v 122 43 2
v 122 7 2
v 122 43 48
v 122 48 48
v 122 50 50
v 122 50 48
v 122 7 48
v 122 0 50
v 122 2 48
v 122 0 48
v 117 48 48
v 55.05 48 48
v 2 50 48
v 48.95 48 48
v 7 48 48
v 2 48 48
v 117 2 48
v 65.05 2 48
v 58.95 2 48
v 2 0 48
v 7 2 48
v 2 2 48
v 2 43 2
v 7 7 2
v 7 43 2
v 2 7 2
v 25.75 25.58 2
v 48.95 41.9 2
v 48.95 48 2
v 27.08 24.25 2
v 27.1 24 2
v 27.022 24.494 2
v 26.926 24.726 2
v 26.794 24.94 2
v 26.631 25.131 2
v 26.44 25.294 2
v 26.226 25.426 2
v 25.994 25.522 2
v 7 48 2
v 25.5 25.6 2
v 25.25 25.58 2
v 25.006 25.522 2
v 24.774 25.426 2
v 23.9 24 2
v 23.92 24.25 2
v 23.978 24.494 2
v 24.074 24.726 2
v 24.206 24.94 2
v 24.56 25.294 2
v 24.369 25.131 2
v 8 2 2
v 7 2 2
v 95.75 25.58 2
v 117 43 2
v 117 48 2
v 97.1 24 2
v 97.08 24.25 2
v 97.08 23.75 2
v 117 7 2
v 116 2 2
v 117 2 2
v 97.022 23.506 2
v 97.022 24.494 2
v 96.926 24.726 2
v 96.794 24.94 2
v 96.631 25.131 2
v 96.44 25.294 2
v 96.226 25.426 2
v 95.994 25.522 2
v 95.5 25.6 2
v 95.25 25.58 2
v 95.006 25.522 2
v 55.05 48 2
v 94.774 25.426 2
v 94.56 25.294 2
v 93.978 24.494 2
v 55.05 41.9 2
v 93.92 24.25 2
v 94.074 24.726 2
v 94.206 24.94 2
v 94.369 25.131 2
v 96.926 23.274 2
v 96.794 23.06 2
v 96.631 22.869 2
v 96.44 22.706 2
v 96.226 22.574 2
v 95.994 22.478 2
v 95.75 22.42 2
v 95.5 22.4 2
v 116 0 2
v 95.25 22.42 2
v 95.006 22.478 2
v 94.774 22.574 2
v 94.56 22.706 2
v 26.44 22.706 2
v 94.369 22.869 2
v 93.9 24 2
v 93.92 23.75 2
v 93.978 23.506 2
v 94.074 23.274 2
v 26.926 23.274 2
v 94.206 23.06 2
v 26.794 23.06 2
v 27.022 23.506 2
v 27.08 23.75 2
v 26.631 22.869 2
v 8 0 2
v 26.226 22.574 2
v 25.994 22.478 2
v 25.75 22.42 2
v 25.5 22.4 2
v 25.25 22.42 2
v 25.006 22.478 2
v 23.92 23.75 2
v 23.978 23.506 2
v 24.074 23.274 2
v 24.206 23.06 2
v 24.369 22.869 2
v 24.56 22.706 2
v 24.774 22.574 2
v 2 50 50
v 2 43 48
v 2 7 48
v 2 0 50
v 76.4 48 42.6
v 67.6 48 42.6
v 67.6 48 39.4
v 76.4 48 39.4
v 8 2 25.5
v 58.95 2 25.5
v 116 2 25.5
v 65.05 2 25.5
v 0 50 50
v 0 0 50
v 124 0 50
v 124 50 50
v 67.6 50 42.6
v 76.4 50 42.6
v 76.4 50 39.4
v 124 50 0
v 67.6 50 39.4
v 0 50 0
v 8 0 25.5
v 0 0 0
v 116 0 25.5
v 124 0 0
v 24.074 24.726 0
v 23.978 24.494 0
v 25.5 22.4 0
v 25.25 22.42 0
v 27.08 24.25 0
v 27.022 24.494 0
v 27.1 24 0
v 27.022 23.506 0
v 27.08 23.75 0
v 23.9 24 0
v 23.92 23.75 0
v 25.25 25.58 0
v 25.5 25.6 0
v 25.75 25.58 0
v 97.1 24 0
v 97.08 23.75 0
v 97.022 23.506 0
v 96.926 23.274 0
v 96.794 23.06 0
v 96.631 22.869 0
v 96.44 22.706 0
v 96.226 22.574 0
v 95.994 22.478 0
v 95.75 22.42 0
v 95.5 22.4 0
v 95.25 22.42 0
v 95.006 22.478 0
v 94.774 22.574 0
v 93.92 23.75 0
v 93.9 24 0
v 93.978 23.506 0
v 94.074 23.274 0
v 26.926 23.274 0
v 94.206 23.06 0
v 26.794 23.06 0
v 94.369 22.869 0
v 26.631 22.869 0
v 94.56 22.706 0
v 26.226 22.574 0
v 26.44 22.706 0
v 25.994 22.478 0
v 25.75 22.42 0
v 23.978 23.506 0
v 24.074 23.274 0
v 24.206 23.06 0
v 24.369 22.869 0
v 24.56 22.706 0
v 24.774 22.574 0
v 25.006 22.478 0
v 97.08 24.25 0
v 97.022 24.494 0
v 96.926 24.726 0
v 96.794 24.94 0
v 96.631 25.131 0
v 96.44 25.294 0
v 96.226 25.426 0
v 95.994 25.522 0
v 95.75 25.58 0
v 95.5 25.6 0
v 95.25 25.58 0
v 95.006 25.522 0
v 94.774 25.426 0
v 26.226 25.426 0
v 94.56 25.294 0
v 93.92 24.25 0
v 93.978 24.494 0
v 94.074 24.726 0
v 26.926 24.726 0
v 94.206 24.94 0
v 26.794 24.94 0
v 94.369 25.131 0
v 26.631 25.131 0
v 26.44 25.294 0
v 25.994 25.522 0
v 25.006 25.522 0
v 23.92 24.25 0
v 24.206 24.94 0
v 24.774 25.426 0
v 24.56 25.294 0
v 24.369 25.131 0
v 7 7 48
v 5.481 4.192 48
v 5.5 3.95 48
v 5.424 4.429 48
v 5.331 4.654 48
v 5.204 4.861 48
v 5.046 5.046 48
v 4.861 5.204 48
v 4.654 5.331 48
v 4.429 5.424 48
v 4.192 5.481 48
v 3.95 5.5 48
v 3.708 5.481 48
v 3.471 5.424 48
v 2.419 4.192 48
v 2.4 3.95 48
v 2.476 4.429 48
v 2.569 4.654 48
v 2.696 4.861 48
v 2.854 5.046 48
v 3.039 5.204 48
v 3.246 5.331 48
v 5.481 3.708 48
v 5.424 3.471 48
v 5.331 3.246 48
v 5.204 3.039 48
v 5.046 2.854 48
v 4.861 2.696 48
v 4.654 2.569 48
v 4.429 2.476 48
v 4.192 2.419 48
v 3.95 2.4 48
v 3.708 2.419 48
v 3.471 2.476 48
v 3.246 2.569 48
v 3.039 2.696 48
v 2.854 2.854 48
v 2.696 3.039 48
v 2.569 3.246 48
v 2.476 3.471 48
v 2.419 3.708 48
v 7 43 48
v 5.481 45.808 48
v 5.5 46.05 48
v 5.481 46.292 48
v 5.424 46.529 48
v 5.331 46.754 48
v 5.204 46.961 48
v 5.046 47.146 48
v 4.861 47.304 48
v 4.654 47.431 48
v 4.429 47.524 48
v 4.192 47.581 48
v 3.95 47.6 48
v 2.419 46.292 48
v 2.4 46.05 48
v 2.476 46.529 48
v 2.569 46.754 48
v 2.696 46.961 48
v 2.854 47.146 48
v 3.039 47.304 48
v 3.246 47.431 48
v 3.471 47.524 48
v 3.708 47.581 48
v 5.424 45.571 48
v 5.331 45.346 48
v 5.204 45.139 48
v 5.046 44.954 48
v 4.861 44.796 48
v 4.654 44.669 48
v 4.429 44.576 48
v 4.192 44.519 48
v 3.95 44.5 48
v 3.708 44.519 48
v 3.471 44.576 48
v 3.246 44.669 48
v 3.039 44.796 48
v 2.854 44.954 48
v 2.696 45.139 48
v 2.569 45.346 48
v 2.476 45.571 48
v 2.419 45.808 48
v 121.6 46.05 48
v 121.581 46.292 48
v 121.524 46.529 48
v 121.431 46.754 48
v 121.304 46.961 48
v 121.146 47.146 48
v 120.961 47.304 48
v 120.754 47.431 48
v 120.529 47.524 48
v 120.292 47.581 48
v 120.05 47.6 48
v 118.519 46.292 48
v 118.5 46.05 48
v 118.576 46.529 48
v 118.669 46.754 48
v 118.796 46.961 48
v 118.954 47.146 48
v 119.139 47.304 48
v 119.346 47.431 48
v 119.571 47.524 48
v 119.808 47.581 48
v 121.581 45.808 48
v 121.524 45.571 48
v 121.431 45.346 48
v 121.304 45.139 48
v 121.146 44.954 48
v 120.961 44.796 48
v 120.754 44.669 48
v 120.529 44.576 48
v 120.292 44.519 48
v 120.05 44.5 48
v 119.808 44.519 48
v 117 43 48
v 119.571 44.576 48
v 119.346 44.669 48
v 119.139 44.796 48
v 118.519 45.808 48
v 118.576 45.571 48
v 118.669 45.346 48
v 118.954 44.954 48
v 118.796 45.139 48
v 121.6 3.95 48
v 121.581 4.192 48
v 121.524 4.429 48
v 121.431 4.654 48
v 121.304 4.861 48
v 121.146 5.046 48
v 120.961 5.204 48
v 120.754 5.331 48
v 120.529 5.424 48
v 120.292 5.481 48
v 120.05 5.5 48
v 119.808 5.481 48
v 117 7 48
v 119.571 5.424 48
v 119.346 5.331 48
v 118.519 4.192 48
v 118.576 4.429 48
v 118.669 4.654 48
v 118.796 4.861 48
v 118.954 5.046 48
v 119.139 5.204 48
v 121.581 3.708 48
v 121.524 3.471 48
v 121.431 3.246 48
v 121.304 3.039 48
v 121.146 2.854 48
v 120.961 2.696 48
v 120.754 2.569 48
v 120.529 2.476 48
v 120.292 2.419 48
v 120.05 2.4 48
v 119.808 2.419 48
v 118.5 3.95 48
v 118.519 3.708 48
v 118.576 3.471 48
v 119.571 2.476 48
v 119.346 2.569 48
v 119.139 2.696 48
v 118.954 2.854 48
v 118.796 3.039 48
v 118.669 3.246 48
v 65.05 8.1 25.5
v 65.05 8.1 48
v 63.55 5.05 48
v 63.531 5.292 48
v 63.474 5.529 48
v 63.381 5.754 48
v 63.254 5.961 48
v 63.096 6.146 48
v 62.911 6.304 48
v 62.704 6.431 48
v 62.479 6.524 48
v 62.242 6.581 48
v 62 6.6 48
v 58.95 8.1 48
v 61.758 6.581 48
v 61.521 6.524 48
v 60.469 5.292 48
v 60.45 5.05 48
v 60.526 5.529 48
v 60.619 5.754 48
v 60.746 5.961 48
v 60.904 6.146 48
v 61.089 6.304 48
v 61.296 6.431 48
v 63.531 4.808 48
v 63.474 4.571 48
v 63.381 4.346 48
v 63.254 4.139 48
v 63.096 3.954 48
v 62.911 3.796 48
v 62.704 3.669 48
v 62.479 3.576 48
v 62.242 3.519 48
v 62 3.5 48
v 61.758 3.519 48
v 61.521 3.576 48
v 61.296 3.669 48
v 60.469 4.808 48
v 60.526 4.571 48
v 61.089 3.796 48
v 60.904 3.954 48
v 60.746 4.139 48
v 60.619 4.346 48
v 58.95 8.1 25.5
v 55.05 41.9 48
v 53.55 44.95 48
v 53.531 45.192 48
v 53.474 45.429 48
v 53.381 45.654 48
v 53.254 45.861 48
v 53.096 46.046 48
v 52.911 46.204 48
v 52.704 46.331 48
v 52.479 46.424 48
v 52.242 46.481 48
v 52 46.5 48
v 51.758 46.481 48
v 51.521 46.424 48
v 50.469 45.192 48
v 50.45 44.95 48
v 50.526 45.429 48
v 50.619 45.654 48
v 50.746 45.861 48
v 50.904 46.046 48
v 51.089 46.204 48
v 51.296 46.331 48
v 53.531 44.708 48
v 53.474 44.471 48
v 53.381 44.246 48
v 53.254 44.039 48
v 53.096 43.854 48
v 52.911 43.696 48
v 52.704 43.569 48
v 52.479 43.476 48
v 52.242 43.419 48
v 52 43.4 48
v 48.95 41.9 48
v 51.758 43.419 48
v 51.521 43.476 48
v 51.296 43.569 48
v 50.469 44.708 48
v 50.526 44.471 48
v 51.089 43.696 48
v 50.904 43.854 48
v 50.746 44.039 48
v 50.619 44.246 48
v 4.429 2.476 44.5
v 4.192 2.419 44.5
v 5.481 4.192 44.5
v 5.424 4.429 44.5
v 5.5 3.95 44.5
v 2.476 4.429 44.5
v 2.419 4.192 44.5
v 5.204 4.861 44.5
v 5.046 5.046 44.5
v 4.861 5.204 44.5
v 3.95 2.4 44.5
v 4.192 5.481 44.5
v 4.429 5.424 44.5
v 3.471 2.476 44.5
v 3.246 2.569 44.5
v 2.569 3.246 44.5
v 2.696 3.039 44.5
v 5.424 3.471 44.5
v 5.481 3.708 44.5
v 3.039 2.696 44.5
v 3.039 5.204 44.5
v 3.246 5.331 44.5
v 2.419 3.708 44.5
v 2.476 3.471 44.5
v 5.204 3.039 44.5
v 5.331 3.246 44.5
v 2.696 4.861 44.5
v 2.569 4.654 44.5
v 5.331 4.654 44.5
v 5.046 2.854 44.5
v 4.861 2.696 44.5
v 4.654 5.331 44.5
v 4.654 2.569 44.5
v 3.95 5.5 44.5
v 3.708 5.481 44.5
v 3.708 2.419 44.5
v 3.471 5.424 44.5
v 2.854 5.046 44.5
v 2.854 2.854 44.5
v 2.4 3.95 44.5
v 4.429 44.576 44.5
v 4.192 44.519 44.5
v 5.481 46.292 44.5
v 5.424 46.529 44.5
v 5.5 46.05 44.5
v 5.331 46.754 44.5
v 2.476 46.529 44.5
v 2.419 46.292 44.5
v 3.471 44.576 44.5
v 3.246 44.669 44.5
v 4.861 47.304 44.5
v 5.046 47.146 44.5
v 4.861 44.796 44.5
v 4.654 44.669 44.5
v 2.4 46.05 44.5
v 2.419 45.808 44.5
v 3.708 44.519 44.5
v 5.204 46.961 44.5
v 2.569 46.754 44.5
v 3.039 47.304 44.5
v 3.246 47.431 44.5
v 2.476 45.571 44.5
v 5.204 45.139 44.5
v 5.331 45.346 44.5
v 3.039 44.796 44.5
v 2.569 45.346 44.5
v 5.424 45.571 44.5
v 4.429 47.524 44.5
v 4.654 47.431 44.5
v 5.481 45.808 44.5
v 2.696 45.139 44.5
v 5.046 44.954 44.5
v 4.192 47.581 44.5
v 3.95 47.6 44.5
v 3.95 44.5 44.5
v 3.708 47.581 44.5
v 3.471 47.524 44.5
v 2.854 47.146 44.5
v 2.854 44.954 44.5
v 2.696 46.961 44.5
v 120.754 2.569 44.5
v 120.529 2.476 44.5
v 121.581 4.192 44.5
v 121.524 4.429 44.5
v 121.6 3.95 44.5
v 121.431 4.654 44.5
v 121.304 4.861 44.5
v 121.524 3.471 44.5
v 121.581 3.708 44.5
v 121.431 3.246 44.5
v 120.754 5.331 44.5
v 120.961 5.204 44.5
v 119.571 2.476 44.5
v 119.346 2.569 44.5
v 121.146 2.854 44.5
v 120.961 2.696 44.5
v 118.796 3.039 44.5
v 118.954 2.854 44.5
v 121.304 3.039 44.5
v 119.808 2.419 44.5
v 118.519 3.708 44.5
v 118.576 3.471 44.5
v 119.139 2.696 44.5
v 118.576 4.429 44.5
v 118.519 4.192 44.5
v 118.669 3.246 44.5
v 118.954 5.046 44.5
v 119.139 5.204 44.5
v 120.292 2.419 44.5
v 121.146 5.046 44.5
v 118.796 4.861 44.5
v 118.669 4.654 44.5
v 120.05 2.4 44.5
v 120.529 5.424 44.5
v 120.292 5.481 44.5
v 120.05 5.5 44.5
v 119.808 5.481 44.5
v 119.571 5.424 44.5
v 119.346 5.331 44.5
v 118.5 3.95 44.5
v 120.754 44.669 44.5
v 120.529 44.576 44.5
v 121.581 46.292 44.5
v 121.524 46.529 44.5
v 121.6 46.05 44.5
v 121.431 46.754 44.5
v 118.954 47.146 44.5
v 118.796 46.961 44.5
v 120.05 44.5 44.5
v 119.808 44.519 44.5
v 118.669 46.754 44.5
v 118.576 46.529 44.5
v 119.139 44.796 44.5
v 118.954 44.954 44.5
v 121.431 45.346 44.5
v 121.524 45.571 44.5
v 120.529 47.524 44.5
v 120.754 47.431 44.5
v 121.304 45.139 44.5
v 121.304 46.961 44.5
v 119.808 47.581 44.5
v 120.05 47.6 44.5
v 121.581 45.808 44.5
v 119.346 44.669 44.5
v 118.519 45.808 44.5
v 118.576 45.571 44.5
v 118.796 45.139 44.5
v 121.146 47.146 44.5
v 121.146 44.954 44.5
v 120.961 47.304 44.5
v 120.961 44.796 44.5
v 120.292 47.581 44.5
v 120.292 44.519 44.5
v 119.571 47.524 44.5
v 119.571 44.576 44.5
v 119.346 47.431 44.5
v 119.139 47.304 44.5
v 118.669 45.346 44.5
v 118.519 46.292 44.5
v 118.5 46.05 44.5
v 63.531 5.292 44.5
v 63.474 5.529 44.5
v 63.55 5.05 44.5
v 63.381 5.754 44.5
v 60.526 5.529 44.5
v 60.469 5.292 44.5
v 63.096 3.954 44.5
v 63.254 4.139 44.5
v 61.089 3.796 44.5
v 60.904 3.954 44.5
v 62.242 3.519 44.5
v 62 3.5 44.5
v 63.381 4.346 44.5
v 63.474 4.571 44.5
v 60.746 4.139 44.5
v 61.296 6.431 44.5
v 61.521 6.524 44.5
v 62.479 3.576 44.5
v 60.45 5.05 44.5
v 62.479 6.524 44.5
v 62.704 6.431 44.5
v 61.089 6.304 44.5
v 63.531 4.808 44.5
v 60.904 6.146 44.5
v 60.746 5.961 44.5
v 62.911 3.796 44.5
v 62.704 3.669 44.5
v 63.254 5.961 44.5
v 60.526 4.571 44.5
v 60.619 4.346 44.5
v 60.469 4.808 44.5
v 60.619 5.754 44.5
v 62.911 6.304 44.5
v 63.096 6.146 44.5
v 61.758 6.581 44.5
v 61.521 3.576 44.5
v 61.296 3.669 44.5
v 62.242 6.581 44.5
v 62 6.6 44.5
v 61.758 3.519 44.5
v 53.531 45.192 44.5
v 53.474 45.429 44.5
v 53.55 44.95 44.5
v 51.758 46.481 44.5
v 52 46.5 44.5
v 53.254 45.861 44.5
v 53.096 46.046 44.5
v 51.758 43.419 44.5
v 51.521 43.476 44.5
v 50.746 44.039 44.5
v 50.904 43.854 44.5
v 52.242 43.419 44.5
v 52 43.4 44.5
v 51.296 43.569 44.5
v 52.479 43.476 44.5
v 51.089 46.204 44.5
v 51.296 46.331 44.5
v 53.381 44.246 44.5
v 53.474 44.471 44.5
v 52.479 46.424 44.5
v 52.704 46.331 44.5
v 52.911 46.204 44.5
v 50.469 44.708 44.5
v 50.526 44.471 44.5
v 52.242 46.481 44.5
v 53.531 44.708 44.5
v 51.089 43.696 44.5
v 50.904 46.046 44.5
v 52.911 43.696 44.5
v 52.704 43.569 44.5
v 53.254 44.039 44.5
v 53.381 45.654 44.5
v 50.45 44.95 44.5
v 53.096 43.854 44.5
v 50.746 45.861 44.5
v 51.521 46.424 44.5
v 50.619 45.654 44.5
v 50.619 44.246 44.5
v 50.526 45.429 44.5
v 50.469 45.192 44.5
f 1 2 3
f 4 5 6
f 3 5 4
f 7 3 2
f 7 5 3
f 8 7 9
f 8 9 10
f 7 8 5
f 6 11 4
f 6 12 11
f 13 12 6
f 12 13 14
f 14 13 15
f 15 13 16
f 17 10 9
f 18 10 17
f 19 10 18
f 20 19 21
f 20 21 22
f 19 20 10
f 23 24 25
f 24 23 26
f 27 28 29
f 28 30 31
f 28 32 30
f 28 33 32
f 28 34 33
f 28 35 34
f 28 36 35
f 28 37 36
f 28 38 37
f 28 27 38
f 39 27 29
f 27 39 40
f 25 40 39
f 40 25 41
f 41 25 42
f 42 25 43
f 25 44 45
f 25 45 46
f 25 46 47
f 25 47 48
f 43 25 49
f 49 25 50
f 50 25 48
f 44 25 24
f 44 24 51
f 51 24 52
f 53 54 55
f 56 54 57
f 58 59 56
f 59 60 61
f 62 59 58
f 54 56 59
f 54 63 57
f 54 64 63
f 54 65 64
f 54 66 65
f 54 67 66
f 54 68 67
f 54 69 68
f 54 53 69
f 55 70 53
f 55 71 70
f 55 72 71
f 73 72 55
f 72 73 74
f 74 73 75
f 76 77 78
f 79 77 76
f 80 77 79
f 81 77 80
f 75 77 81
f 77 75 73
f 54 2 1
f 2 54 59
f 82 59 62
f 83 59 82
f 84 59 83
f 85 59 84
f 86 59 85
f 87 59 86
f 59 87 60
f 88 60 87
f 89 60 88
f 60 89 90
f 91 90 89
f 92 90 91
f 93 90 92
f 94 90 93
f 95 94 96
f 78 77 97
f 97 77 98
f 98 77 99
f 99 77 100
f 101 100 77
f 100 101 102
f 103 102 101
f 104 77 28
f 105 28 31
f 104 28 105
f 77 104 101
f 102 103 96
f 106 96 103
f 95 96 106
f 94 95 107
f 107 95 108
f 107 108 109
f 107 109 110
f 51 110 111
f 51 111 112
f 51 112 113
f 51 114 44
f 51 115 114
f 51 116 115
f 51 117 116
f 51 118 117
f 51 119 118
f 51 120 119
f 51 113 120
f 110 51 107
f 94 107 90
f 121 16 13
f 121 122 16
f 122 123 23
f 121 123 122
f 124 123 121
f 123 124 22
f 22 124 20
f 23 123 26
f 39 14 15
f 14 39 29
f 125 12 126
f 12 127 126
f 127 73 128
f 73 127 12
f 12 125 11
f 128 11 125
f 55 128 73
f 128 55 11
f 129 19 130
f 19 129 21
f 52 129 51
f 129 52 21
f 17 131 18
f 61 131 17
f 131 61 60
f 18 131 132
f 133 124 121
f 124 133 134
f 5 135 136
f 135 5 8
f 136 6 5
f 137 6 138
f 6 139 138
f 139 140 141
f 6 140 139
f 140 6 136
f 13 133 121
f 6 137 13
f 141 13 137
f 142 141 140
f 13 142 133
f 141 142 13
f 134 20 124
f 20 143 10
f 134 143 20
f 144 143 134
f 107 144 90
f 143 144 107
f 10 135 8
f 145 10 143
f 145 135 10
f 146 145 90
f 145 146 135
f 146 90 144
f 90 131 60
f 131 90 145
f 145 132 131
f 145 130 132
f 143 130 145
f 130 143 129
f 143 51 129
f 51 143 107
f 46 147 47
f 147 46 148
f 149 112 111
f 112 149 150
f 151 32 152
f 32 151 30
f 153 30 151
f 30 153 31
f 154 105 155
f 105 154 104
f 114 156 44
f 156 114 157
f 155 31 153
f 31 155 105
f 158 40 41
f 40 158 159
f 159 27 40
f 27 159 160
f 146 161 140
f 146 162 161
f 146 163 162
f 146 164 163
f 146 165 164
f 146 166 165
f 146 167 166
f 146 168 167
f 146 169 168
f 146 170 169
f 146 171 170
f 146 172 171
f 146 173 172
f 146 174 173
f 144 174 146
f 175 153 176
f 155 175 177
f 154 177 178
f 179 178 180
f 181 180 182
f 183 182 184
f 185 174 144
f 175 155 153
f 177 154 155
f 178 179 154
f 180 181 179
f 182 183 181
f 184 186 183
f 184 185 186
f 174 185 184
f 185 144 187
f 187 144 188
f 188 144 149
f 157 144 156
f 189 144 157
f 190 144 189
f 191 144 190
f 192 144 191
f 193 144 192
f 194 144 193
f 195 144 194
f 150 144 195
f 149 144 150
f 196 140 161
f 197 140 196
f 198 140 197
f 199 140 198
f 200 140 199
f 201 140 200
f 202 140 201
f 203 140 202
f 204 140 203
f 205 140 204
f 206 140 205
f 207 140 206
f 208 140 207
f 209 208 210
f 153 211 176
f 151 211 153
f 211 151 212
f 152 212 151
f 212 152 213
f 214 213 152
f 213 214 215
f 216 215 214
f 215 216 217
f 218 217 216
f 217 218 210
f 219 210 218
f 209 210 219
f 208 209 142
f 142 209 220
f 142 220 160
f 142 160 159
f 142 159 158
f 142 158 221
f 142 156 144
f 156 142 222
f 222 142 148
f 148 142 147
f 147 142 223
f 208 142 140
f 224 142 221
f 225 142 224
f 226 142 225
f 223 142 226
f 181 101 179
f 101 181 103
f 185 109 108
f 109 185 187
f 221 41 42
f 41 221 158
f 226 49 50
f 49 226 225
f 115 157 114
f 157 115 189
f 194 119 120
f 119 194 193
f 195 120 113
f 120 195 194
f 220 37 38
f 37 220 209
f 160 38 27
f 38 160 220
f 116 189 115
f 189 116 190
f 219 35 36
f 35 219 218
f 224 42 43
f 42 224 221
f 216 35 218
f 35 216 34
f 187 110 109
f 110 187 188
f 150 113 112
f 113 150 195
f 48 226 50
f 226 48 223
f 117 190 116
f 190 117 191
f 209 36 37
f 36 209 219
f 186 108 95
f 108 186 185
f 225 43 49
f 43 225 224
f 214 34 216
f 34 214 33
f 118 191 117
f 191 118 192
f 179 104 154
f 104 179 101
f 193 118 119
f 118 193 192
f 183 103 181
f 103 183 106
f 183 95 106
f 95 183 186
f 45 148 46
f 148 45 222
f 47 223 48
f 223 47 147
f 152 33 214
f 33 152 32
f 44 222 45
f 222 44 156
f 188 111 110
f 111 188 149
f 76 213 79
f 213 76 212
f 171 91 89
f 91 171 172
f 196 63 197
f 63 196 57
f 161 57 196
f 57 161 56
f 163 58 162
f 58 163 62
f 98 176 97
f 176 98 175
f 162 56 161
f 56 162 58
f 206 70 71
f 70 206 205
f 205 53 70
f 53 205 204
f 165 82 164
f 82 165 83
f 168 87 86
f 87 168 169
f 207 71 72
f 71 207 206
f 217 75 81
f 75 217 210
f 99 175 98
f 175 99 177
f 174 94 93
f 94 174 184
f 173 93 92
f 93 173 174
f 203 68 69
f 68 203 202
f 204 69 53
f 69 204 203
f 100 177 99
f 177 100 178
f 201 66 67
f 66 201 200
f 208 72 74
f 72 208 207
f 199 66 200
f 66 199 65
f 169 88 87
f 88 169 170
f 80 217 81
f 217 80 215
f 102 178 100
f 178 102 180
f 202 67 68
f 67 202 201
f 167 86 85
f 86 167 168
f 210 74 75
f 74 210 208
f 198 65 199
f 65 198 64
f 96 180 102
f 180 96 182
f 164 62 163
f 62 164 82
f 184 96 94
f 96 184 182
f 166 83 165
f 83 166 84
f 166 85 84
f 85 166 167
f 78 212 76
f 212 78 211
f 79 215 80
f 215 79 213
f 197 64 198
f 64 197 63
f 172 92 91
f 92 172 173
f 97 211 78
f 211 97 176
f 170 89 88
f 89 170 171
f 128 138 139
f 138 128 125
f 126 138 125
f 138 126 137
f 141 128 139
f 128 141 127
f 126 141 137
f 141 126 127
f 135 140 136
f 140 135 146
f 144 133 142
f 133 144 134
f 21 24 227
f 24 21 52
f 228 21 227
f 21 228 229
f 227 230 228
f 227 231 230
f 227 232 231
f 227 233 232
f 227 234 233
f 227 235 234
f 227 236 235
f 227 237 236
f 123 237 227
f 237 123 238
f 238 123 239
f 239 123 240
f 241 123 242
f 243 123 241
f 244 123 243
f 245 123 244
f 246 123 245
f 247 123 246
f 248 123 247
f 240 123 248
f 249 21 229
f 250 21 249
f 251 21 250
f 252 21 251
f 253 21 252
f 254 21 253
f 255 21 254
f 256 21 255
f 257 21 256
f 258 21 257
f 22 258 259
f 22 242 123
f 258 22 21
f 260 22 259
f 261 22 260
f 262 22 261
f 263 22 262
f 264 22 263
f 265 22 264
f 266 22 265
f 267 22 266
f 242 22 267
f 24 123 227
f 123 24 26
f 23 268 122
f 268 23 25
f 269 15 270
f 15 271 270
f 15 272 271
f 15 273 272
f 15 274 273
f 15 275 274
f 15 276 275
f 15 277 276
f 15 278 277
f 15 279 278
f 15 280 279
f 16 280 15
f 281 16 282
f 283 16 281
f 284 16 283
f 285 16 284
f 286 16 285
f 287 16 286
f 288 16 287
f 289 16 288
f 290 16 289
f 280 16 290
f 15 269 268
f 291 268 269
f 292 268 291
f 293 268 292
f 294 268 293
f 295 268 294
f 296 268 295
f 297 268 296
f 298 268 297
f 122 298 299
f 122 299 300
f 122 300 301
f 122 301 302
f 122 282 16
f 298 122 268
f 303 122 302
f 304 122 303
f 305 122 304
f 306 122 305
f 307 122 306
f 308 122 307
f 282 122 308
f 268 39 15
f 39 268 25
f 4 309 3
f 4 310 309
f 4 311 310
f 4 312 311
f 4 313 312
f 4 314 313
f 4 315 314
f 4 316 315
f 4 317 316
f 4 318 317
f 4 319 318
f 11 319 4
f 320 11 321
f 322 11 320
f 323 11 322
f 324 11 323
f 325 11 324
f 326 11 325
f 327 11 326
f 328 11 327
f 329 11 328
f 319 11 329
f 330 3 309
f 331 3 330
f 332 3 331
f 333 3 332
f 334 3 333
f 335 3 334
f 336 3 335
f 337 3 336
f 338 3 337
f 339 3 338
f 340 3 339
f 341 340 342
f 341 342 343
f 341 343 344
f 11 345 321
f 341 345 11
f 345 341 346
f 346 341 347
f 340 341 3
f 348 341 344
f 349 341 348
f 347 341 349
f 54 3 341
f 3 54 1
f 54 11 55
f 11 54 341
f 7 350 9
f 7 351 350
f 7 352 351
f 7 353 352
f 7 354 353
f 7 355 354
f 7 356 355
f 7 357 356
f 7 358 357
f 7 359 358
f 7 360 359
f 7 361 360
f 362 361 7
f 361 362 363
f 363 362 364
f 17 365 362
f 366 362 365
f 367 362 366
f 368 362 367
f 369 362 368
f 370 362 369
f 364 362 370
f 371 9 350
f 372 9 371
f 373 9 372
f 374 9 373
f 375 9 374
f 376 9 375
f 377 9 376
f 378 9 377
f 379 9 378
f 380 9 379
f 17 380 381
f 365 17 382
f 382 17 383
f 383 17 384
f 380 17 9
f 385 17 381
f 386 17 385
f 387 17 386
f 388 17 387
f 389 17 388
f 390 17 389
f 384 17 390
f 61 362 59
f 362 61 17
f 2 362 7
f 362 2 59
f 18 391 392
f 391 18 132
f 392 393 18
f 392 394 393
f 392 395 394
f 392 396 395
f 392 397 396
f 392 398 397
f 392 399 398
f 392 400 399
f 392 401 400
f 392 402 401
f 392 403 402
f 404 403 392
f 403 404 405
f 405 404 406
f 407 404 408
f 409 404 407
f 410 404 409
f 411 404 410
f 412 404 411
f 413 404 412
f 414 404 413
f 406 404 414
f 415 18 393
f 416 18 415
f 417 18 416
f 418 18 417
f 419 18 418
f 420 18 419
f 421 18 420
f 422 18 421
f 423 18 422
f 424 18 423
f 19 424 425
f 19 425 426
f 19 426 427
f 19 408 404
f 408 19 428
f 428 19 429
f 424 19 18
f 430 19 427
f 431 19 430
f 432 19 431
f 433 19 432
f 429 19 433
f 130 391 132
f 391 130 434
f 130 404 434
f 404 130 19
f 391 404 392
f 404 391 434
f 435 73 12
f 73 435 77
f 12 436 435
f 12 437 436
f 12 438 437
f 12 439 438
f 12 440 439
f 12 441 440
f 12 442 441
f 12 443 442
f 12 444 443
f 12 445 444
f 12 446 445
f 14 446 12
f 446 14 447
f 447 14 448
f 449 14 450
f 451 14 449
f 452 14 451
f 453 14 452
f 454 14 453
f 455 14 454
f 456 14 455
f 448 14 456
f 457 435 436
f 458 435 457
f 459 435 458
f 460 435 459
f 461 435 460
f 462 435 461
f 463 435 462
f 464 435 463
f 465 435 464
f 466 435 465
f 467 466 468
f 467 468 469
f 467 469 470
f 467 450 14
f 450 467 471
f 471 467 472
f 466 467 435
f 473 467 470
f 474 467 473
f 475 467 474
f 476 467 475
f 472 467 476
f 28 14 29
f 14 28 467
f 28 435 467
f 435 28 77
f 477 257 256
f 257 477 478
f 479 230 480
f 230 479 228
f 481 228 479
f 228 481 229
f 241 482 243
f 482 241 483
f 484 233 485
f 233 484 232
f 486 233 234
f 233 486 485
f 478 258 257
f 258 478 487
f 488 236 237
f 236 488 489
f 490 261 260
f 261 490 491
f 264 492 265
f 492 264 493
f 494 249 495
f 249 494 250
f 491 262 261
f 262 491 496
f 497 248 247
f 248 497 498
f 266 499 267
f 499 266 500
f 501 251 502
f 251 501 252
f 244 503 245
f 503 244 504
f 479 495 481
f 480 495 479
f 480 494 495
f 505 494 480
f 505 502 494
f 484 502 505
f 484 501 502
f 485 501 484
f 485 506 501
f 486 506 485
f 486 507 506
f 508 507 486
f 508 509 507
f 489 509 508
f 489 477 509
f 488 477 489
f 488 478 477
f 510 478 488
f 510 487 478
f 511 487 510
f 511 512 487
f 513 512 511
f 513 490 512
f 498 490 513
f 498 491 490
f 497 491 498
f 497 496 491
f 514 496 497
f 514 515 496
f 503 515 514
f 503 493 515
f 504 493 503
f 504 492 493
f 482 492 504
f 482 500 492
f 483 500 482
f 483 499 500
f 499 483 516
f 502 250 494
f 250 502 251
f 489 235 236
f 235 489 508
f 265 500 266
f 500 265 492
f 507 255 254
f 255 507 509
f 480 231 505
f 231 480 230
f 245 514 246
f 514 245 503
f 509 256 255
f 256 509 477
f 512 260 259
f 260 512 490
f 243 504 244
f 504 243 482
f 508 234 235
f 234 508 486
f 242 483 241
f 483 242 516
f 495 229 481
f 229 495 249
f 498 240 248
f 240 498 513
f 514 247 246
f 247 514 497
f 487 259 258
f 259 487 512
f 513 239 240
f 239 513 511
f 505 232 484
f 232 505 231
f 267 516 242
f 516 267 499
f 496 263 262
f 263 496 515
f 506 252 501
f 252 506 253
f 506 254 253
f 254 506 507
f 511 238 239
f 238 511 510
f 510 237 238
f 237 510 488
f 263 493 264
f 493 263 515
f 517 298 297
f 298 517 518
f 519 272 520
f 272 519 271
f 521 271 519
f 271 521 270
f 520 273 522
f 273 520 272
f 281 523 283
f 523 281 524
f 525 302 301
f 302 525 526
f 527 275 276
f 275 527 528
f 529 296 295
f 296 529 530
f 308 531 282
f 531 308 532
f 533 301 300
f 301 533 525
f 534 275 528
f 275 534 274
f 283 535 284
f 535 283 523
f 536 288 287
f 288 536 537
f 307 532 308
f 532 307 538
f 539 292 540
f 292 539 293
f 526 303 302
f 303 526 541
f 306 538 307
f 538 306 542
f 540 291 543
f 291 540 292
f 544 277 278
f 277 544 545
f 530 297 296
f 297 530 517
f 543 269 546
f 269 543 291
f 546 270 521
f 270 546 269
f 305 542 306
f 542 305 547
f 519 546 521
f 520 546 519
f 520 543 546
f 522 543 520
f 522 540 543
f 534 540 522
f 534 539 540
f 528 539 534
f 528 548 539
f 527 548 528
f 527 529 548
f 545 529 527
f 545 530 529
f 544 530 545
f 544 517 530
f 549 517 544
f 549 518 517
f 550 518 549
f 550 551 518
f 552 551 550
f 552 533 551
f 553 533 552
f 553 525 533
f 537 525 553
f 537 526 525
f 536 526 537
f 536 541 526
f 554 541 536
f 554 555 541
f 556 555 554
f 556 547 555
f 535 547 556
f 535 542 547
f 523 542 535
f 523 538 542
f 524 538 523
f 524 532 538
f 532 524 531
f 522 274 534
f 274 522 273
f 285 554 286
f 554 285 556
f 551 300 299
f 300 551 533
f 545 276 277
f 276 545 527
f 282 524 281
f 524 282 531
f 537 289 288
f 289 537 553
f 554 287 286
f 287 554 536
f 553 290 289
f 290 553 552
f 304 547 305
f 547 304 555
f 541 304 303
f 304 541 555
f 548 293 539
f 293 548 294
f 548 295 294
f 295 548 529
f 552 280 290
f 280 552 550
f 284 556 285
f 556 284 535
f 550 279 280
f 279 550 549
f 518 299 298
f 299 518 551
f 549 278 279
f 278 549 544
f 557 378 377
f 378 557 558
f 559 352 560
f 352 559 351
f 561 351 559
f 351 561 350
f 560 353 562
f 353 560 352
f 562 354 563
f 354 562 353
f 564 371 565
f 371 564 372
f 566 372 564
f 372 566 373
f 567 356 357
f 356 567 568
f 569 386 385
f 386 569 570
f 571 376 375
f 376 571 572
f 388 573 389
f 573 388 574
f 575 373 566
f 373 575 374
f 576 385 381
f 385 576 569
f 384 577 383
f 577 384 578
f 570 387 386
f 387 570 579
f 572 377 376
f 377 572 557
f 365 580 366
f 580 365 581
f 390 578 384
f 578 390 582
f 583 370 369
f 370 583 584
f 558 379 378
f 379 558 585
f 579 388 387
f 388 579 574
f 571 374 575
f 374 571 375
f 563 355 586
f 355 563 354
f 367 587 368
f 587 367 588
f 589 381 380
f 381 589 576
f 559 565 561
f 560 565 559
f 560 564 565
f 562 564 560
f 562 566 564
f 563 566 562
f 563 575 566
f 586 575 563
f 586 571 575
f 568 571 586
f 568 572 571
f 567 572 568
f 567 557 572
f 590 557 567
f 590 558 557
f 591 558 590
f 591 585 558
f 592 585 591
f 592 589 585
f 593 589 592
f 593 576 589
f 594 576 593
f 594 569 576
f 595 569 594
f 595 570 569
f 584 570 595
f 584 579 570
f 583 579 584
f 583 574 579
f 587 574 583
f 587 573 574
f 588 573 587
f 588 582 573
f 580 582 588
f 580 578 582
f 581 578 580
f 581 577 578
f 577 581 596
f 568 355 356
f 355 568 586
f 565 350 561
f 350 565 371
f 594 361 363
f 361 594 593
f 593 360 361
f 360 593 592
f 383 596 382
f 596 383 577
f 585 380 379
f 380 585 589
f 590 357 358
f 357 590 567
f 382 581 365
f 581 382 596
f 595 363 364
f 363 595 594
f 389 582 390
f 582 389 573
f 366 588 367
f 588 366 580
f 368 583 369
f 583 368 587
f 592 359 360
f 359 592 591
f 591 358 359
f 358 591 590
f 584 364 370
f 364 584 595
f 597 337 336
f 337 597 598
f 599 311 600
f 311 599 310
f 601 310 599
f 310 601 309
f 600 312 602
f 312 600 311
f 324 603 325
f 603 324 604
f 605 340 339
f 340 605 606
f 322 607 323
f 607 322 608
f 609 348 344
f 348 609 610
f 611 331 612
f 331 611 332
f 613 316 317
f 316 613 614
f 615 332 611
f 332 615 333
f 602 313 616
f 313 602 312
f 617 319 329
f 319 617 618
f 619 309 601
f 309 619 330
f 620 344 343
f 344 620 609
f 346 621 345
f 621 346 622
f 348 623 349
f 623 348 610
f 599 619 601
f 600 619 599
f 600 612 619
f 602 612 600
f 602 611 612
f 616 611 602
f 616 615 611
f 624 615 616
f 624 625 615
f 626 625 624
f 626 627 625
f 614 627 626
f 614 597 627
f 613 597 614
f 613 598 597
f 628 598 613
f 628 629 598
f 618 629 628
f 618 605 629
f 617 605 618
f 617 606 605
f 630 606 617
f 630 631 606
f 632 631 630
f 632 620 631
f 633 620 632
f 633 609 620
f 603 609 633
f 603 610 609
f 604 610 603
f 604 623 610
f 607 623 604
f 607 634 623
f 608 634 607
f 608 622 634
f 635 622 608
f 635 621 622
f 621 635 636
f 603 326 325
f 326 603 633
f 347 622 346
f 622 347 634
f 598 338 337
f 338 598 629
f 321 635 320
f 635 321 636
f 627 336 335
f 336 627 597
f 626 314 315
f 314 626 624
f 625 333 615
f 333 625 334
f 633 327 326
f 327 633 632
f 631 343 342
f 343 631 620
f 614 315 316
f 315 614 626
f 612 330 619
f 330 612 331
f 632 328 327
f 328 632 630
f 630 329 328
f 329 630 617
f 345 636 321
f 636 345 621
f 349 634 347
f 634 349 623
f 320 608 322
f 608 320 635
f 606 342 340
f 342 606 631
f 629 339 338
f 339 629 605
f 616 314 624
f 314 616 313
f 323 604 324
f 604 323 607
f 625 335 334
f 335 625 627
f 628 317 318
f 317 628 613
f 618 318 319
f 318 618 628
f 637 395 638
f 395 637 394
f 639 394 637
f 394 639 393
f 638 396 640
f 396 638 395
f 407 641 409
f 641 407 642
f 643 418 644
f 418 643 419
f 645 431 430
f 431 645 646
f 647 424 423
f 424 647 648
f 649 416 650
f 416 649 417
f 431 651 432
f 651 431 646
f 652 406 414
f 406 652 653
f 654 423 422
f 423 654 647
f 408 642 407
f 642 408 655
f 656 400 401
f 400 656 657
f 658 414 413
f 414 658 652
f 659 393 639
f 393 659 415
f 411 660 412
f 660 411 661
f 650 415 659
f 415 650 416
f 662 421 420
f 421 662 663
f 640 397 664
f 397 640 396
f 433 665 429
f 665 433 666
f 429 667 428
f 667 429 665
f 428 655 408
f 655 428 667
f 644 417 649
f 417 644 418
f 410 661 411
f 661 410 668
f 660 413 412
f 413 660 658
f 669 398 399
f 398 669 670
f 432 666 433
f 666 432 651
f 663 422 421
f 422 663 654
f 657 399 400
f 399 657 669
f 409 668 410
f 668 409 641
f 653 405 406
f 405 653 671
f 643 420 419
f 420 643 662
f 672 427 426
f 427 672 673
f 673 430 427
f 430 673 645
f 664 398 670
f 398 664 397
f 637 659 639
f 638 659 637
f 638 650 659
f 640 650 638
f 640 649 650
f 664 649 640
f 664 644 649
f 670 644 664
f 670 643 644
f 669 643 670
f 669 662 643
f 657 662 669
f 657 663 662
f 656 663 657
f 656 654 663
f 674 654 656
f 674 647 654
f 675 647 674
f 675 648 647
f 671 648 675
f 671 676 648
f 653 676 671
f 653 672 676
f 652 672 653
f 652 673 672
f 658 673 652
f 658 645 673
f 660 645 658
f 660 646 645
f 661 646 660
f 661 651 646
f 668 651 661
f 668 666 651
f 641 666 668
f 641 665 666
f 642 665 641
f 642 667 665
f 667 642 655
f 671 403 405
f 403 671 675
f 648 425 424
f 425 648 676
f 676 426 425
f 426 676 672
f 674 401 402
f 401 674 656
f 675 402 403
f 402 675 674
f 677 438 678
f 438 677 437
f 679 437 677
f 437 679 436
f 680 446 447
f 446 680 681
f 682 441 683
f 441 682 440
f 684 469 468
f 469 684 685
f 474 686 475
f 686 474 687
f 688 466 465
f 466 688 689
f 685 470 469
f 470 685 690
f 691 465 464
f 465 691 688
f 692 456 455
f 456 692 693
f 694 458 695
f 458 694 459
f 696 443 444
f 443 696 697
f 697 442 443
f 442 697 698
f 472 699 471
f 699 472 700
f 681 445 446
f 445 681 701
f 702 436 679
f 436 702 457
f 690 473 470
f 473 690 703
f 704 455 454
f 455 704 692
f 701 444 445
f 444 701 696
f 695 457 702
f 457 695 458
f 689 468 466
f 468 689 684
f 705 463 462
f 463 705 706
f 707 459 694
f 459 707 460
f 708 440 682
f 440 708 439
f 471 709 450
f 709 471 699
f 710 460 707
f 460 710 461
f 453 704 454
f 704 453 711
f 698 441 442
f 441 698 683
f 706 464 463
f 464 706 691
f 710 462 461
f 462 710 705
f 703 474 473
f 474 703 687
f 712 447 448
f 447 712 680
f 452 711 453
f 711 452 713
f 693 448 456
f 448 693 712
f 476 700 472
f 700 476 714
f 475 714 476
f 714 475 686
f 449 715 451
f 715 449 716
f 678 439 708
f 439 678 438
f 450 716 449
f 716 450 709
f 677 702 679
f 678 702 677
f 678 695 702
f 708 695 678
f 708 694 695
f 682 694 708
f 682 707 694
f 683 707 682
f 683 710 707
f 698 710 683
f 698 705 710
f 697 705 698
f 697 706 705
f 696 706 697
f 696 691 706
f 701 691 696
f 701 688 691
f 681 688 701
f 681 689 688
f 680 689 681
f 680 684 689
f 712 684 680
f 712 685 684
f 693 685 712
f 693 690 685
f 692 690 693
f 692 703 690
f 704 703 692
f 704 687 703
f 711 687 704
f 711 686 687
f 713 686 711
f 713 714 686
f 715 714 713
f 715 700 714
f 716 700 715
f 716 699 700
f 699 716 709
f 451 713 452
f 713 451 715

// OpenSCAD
// Enclosure for ESP32FW / ULN2003 / 28BYJ-48 - Box

$fn=40;

// Electronics lid definitions (copy and paste from corresponding SCAD file)
box_lid_screw_hole_radius=1;

box_drv_support_diameter=6;
box_drv_support_length=4;
box_drv_support_hole_depth=3;
box_drv_length=29.6;
box_drv_width=26.9;
box_drv_side_offset=2.7+1;

box_esp32c3_back=23.4;
box_esp32c3_width=17.8;
box_esp32c3_depth=11;
box_esp32c3_board_1=5.5;
box_esp32c3_board_thickness=1.3;
box_esp32c3_board_groove=2;
box_esp32c3_board_extra=3;
box_esp32c3_block_wall=box_esp32c3_back-box_esp32c3_depth;

// Electronics box definitions
box_length=124;
box_width=50;
box_height=50;
box_lid_thickness=2;
box_wall_thickness=2;
box_hole_height=22.5*0+23.5;
box_hole_length=108;
box_screw_separation=70;
box_screw_1_x=25.5;
box_screw_2_x=box_screw_1_x+box_screw_separation;
box_screw_y=24;
box_screw_diameter=3.2;
box_lid_support_hole_depth=3.5;
box_lid_support_hole_radius=3.1/2;
box_lid_support_hole_offset=1.5;
box_lid_support_mid_radius=2*box_lid_support_hole_radius+2*box_lid_support_hole_offset;
box_corner_radius=5;
box_boards_length=70;
box_side_height=box_height-box_lid_thickness;
box_usb_length=8.8;
box_usb_height=3.2;
box_usb_offset=5.4;
box_usb_distance=0;

// Box
difference()
 {
  // Box attaches to the wheel and provides support for the lid which holds the motor and the electronics 
   cube([box_length,box_width,box_height]);
   union()
   {
    // Box inner space
    translate([box_wall_thickness,box_wall_thickness,box_wall_thickness])
     cube([box_length-2*box_wall_thickness,box_width-2*box_wall_thickness,box_height-2*box_wall_thickness]);
    // Space for lid
    translate([box_wall_thickness,0,box_height-box_wall_thickness])
     cube([box_length-2*box_wall_thickness,box_width,box_wall_thickness]);
    // Hole for filter wheel
    translate([(box_length-box_hole_length)/2,0,box_wall_thickness])
     cube([box_hole_length,box_wall_thickness,box_hole_height]);
    // Holes for filter wheel screws 
    translate([box_screw_1_x,box_screw_y,0])
     cylinder(box_wall_thickness,d=box_screw_diameter);
    translate([box_screw_2_x,box_screw_y,0])
     cylinder(box_wall_thickness,d=box_screw_diameter);
    // Hole for ESP32-C3 usb connector
   translate([box_length-box_boards_length-0*box_wall_thickness+box_lid_support_mid_radius+box_esp32c3_board_extra+box_esp32c3_width/2-box_usb_length/2,box_width-box_wall_thickness,box_height-box_wall_thickness-box_usb_offset-box_usb_height])   
     cube([box_usb_length,box_wall_thickness,box_usb_height]);
   }
 } 
 
// Lid supports
difference()
 {
 union()
  {
   // Corner supports
   box_corner(0,box_wall_thickness,box_wall_thickness,box_wall_thickness,box_height-2*box_wall_thickness);
   box_corner(-90,box_wall_thickness,box_width-box_wall_thickness,box_wall_thickness,box_height-2*box_wall_thickness);
   box_corner(180,box_length-box_wall_thickness,box_width-box_wall_thickness,box_wall_thickness,box_height-2*box_wall_thickness);
   box_corner(90,box_length-box_wall_thickness,box_wall_thickness,box_wall_thickness,box_height-2*box_wall_thickness);
   
   // Middle supports
   translate([box_length/2-box_lid_support_mid_radius/2,box_wall_thickness,box_hole_height+box_wall_thickness])
    cube([box_lid_support_mid_radius,box_lid_support_mid_radius,box_height-box_hole_height-2*box_wall_thickness]);
   translate([box_length-box_boards_length-box_wall_thickness-box_lid_support_mid_radius/2,box_width-box_wall_thickness-box_lid_support_mid_radius,box_wall_thickness])
     cube([box_lid_support_mid_radius,box_lid_support_mid_radius,box_height-2*box_wall_thickness]);
  }
 union()
  {
   // Corner support holes
   box_lid_support_hole(box_wall_thickness+box_corner_radius-box_lid_support_hole_offset-box_lid_support_hole_radius,box_wall_thickness+box_corner_radius-box_lid_support_hole_offset-box_lid_support_hole_radius,box_side_height-box_lid_support_hole_depth);
   box_lid_support_hole(box_wall_thickness+box_corner_radius-box_lid_support_hole_offset-box_lid_support_hole_radius,box_width-box_wall_thickness-box_corner_radius+box_lid_support_hole_offset+box_lid_support_hole_radius,box_side_height-box_lid_support_hole_depth);
   box_lid_support_hole(box_length-box_wall_thickness-box_corner_radius+box_lid_support_hole_offset+box_lid_support_hole_radius,box_wall_thickness+box_corner_radius-box_lid_support_hole_offset-box_lid_support_hole_radius,box_side_height-box_lid_support_hole_depth);
   box_lid_support_hole(box_length-box_wall_thickness-box_corner_radius+box_lid_support_hole_offset+box_lid_support_hole_radius,box_width-box_wall_thickness-box_corner_radius+box_lid_support_hole_offset+box_lid_support_hole_radius,box_side_height-box_lid_support_hole_depth);

   // Middle supports holes   
   box_lid_support_hole(box_length/2,box_wall_thickness+box_lid_support_mid_radius-box_lid_support_hole_offset-box_lid_support_hole_radius,box_side_height-box_lid_support_hole_depth);
   box_lid_support_hole(box_length-box_boards_length-box_wall_thickness,box_width-box_wall_thickness-box_lid_support_mid_radius+box_lid_support_hole_offset+box_lid_support_hole_radius,box_side_height-box_lid_support_hole_depth);
      
  }
 }

// Modules

module box_corner(angle,x,y,z,length)
 {
  translate([x,y,z])
   rotate([0,0,angle])
    intersection()
     {
//      cylinder(h=scale*(box_side_height)-box_lid_thickness,r=box_corner_radius,center=false);
      cube(size=[box_corner_radius,box_corner_radius,length]);
     }      
 }
 
module box_lid_support_hole(x,y,z)
 {
  translate([x,y,z])
   cylinder(h=box_lid_support_hole_depth,r=box_lid_support_hole_radius);
 }
